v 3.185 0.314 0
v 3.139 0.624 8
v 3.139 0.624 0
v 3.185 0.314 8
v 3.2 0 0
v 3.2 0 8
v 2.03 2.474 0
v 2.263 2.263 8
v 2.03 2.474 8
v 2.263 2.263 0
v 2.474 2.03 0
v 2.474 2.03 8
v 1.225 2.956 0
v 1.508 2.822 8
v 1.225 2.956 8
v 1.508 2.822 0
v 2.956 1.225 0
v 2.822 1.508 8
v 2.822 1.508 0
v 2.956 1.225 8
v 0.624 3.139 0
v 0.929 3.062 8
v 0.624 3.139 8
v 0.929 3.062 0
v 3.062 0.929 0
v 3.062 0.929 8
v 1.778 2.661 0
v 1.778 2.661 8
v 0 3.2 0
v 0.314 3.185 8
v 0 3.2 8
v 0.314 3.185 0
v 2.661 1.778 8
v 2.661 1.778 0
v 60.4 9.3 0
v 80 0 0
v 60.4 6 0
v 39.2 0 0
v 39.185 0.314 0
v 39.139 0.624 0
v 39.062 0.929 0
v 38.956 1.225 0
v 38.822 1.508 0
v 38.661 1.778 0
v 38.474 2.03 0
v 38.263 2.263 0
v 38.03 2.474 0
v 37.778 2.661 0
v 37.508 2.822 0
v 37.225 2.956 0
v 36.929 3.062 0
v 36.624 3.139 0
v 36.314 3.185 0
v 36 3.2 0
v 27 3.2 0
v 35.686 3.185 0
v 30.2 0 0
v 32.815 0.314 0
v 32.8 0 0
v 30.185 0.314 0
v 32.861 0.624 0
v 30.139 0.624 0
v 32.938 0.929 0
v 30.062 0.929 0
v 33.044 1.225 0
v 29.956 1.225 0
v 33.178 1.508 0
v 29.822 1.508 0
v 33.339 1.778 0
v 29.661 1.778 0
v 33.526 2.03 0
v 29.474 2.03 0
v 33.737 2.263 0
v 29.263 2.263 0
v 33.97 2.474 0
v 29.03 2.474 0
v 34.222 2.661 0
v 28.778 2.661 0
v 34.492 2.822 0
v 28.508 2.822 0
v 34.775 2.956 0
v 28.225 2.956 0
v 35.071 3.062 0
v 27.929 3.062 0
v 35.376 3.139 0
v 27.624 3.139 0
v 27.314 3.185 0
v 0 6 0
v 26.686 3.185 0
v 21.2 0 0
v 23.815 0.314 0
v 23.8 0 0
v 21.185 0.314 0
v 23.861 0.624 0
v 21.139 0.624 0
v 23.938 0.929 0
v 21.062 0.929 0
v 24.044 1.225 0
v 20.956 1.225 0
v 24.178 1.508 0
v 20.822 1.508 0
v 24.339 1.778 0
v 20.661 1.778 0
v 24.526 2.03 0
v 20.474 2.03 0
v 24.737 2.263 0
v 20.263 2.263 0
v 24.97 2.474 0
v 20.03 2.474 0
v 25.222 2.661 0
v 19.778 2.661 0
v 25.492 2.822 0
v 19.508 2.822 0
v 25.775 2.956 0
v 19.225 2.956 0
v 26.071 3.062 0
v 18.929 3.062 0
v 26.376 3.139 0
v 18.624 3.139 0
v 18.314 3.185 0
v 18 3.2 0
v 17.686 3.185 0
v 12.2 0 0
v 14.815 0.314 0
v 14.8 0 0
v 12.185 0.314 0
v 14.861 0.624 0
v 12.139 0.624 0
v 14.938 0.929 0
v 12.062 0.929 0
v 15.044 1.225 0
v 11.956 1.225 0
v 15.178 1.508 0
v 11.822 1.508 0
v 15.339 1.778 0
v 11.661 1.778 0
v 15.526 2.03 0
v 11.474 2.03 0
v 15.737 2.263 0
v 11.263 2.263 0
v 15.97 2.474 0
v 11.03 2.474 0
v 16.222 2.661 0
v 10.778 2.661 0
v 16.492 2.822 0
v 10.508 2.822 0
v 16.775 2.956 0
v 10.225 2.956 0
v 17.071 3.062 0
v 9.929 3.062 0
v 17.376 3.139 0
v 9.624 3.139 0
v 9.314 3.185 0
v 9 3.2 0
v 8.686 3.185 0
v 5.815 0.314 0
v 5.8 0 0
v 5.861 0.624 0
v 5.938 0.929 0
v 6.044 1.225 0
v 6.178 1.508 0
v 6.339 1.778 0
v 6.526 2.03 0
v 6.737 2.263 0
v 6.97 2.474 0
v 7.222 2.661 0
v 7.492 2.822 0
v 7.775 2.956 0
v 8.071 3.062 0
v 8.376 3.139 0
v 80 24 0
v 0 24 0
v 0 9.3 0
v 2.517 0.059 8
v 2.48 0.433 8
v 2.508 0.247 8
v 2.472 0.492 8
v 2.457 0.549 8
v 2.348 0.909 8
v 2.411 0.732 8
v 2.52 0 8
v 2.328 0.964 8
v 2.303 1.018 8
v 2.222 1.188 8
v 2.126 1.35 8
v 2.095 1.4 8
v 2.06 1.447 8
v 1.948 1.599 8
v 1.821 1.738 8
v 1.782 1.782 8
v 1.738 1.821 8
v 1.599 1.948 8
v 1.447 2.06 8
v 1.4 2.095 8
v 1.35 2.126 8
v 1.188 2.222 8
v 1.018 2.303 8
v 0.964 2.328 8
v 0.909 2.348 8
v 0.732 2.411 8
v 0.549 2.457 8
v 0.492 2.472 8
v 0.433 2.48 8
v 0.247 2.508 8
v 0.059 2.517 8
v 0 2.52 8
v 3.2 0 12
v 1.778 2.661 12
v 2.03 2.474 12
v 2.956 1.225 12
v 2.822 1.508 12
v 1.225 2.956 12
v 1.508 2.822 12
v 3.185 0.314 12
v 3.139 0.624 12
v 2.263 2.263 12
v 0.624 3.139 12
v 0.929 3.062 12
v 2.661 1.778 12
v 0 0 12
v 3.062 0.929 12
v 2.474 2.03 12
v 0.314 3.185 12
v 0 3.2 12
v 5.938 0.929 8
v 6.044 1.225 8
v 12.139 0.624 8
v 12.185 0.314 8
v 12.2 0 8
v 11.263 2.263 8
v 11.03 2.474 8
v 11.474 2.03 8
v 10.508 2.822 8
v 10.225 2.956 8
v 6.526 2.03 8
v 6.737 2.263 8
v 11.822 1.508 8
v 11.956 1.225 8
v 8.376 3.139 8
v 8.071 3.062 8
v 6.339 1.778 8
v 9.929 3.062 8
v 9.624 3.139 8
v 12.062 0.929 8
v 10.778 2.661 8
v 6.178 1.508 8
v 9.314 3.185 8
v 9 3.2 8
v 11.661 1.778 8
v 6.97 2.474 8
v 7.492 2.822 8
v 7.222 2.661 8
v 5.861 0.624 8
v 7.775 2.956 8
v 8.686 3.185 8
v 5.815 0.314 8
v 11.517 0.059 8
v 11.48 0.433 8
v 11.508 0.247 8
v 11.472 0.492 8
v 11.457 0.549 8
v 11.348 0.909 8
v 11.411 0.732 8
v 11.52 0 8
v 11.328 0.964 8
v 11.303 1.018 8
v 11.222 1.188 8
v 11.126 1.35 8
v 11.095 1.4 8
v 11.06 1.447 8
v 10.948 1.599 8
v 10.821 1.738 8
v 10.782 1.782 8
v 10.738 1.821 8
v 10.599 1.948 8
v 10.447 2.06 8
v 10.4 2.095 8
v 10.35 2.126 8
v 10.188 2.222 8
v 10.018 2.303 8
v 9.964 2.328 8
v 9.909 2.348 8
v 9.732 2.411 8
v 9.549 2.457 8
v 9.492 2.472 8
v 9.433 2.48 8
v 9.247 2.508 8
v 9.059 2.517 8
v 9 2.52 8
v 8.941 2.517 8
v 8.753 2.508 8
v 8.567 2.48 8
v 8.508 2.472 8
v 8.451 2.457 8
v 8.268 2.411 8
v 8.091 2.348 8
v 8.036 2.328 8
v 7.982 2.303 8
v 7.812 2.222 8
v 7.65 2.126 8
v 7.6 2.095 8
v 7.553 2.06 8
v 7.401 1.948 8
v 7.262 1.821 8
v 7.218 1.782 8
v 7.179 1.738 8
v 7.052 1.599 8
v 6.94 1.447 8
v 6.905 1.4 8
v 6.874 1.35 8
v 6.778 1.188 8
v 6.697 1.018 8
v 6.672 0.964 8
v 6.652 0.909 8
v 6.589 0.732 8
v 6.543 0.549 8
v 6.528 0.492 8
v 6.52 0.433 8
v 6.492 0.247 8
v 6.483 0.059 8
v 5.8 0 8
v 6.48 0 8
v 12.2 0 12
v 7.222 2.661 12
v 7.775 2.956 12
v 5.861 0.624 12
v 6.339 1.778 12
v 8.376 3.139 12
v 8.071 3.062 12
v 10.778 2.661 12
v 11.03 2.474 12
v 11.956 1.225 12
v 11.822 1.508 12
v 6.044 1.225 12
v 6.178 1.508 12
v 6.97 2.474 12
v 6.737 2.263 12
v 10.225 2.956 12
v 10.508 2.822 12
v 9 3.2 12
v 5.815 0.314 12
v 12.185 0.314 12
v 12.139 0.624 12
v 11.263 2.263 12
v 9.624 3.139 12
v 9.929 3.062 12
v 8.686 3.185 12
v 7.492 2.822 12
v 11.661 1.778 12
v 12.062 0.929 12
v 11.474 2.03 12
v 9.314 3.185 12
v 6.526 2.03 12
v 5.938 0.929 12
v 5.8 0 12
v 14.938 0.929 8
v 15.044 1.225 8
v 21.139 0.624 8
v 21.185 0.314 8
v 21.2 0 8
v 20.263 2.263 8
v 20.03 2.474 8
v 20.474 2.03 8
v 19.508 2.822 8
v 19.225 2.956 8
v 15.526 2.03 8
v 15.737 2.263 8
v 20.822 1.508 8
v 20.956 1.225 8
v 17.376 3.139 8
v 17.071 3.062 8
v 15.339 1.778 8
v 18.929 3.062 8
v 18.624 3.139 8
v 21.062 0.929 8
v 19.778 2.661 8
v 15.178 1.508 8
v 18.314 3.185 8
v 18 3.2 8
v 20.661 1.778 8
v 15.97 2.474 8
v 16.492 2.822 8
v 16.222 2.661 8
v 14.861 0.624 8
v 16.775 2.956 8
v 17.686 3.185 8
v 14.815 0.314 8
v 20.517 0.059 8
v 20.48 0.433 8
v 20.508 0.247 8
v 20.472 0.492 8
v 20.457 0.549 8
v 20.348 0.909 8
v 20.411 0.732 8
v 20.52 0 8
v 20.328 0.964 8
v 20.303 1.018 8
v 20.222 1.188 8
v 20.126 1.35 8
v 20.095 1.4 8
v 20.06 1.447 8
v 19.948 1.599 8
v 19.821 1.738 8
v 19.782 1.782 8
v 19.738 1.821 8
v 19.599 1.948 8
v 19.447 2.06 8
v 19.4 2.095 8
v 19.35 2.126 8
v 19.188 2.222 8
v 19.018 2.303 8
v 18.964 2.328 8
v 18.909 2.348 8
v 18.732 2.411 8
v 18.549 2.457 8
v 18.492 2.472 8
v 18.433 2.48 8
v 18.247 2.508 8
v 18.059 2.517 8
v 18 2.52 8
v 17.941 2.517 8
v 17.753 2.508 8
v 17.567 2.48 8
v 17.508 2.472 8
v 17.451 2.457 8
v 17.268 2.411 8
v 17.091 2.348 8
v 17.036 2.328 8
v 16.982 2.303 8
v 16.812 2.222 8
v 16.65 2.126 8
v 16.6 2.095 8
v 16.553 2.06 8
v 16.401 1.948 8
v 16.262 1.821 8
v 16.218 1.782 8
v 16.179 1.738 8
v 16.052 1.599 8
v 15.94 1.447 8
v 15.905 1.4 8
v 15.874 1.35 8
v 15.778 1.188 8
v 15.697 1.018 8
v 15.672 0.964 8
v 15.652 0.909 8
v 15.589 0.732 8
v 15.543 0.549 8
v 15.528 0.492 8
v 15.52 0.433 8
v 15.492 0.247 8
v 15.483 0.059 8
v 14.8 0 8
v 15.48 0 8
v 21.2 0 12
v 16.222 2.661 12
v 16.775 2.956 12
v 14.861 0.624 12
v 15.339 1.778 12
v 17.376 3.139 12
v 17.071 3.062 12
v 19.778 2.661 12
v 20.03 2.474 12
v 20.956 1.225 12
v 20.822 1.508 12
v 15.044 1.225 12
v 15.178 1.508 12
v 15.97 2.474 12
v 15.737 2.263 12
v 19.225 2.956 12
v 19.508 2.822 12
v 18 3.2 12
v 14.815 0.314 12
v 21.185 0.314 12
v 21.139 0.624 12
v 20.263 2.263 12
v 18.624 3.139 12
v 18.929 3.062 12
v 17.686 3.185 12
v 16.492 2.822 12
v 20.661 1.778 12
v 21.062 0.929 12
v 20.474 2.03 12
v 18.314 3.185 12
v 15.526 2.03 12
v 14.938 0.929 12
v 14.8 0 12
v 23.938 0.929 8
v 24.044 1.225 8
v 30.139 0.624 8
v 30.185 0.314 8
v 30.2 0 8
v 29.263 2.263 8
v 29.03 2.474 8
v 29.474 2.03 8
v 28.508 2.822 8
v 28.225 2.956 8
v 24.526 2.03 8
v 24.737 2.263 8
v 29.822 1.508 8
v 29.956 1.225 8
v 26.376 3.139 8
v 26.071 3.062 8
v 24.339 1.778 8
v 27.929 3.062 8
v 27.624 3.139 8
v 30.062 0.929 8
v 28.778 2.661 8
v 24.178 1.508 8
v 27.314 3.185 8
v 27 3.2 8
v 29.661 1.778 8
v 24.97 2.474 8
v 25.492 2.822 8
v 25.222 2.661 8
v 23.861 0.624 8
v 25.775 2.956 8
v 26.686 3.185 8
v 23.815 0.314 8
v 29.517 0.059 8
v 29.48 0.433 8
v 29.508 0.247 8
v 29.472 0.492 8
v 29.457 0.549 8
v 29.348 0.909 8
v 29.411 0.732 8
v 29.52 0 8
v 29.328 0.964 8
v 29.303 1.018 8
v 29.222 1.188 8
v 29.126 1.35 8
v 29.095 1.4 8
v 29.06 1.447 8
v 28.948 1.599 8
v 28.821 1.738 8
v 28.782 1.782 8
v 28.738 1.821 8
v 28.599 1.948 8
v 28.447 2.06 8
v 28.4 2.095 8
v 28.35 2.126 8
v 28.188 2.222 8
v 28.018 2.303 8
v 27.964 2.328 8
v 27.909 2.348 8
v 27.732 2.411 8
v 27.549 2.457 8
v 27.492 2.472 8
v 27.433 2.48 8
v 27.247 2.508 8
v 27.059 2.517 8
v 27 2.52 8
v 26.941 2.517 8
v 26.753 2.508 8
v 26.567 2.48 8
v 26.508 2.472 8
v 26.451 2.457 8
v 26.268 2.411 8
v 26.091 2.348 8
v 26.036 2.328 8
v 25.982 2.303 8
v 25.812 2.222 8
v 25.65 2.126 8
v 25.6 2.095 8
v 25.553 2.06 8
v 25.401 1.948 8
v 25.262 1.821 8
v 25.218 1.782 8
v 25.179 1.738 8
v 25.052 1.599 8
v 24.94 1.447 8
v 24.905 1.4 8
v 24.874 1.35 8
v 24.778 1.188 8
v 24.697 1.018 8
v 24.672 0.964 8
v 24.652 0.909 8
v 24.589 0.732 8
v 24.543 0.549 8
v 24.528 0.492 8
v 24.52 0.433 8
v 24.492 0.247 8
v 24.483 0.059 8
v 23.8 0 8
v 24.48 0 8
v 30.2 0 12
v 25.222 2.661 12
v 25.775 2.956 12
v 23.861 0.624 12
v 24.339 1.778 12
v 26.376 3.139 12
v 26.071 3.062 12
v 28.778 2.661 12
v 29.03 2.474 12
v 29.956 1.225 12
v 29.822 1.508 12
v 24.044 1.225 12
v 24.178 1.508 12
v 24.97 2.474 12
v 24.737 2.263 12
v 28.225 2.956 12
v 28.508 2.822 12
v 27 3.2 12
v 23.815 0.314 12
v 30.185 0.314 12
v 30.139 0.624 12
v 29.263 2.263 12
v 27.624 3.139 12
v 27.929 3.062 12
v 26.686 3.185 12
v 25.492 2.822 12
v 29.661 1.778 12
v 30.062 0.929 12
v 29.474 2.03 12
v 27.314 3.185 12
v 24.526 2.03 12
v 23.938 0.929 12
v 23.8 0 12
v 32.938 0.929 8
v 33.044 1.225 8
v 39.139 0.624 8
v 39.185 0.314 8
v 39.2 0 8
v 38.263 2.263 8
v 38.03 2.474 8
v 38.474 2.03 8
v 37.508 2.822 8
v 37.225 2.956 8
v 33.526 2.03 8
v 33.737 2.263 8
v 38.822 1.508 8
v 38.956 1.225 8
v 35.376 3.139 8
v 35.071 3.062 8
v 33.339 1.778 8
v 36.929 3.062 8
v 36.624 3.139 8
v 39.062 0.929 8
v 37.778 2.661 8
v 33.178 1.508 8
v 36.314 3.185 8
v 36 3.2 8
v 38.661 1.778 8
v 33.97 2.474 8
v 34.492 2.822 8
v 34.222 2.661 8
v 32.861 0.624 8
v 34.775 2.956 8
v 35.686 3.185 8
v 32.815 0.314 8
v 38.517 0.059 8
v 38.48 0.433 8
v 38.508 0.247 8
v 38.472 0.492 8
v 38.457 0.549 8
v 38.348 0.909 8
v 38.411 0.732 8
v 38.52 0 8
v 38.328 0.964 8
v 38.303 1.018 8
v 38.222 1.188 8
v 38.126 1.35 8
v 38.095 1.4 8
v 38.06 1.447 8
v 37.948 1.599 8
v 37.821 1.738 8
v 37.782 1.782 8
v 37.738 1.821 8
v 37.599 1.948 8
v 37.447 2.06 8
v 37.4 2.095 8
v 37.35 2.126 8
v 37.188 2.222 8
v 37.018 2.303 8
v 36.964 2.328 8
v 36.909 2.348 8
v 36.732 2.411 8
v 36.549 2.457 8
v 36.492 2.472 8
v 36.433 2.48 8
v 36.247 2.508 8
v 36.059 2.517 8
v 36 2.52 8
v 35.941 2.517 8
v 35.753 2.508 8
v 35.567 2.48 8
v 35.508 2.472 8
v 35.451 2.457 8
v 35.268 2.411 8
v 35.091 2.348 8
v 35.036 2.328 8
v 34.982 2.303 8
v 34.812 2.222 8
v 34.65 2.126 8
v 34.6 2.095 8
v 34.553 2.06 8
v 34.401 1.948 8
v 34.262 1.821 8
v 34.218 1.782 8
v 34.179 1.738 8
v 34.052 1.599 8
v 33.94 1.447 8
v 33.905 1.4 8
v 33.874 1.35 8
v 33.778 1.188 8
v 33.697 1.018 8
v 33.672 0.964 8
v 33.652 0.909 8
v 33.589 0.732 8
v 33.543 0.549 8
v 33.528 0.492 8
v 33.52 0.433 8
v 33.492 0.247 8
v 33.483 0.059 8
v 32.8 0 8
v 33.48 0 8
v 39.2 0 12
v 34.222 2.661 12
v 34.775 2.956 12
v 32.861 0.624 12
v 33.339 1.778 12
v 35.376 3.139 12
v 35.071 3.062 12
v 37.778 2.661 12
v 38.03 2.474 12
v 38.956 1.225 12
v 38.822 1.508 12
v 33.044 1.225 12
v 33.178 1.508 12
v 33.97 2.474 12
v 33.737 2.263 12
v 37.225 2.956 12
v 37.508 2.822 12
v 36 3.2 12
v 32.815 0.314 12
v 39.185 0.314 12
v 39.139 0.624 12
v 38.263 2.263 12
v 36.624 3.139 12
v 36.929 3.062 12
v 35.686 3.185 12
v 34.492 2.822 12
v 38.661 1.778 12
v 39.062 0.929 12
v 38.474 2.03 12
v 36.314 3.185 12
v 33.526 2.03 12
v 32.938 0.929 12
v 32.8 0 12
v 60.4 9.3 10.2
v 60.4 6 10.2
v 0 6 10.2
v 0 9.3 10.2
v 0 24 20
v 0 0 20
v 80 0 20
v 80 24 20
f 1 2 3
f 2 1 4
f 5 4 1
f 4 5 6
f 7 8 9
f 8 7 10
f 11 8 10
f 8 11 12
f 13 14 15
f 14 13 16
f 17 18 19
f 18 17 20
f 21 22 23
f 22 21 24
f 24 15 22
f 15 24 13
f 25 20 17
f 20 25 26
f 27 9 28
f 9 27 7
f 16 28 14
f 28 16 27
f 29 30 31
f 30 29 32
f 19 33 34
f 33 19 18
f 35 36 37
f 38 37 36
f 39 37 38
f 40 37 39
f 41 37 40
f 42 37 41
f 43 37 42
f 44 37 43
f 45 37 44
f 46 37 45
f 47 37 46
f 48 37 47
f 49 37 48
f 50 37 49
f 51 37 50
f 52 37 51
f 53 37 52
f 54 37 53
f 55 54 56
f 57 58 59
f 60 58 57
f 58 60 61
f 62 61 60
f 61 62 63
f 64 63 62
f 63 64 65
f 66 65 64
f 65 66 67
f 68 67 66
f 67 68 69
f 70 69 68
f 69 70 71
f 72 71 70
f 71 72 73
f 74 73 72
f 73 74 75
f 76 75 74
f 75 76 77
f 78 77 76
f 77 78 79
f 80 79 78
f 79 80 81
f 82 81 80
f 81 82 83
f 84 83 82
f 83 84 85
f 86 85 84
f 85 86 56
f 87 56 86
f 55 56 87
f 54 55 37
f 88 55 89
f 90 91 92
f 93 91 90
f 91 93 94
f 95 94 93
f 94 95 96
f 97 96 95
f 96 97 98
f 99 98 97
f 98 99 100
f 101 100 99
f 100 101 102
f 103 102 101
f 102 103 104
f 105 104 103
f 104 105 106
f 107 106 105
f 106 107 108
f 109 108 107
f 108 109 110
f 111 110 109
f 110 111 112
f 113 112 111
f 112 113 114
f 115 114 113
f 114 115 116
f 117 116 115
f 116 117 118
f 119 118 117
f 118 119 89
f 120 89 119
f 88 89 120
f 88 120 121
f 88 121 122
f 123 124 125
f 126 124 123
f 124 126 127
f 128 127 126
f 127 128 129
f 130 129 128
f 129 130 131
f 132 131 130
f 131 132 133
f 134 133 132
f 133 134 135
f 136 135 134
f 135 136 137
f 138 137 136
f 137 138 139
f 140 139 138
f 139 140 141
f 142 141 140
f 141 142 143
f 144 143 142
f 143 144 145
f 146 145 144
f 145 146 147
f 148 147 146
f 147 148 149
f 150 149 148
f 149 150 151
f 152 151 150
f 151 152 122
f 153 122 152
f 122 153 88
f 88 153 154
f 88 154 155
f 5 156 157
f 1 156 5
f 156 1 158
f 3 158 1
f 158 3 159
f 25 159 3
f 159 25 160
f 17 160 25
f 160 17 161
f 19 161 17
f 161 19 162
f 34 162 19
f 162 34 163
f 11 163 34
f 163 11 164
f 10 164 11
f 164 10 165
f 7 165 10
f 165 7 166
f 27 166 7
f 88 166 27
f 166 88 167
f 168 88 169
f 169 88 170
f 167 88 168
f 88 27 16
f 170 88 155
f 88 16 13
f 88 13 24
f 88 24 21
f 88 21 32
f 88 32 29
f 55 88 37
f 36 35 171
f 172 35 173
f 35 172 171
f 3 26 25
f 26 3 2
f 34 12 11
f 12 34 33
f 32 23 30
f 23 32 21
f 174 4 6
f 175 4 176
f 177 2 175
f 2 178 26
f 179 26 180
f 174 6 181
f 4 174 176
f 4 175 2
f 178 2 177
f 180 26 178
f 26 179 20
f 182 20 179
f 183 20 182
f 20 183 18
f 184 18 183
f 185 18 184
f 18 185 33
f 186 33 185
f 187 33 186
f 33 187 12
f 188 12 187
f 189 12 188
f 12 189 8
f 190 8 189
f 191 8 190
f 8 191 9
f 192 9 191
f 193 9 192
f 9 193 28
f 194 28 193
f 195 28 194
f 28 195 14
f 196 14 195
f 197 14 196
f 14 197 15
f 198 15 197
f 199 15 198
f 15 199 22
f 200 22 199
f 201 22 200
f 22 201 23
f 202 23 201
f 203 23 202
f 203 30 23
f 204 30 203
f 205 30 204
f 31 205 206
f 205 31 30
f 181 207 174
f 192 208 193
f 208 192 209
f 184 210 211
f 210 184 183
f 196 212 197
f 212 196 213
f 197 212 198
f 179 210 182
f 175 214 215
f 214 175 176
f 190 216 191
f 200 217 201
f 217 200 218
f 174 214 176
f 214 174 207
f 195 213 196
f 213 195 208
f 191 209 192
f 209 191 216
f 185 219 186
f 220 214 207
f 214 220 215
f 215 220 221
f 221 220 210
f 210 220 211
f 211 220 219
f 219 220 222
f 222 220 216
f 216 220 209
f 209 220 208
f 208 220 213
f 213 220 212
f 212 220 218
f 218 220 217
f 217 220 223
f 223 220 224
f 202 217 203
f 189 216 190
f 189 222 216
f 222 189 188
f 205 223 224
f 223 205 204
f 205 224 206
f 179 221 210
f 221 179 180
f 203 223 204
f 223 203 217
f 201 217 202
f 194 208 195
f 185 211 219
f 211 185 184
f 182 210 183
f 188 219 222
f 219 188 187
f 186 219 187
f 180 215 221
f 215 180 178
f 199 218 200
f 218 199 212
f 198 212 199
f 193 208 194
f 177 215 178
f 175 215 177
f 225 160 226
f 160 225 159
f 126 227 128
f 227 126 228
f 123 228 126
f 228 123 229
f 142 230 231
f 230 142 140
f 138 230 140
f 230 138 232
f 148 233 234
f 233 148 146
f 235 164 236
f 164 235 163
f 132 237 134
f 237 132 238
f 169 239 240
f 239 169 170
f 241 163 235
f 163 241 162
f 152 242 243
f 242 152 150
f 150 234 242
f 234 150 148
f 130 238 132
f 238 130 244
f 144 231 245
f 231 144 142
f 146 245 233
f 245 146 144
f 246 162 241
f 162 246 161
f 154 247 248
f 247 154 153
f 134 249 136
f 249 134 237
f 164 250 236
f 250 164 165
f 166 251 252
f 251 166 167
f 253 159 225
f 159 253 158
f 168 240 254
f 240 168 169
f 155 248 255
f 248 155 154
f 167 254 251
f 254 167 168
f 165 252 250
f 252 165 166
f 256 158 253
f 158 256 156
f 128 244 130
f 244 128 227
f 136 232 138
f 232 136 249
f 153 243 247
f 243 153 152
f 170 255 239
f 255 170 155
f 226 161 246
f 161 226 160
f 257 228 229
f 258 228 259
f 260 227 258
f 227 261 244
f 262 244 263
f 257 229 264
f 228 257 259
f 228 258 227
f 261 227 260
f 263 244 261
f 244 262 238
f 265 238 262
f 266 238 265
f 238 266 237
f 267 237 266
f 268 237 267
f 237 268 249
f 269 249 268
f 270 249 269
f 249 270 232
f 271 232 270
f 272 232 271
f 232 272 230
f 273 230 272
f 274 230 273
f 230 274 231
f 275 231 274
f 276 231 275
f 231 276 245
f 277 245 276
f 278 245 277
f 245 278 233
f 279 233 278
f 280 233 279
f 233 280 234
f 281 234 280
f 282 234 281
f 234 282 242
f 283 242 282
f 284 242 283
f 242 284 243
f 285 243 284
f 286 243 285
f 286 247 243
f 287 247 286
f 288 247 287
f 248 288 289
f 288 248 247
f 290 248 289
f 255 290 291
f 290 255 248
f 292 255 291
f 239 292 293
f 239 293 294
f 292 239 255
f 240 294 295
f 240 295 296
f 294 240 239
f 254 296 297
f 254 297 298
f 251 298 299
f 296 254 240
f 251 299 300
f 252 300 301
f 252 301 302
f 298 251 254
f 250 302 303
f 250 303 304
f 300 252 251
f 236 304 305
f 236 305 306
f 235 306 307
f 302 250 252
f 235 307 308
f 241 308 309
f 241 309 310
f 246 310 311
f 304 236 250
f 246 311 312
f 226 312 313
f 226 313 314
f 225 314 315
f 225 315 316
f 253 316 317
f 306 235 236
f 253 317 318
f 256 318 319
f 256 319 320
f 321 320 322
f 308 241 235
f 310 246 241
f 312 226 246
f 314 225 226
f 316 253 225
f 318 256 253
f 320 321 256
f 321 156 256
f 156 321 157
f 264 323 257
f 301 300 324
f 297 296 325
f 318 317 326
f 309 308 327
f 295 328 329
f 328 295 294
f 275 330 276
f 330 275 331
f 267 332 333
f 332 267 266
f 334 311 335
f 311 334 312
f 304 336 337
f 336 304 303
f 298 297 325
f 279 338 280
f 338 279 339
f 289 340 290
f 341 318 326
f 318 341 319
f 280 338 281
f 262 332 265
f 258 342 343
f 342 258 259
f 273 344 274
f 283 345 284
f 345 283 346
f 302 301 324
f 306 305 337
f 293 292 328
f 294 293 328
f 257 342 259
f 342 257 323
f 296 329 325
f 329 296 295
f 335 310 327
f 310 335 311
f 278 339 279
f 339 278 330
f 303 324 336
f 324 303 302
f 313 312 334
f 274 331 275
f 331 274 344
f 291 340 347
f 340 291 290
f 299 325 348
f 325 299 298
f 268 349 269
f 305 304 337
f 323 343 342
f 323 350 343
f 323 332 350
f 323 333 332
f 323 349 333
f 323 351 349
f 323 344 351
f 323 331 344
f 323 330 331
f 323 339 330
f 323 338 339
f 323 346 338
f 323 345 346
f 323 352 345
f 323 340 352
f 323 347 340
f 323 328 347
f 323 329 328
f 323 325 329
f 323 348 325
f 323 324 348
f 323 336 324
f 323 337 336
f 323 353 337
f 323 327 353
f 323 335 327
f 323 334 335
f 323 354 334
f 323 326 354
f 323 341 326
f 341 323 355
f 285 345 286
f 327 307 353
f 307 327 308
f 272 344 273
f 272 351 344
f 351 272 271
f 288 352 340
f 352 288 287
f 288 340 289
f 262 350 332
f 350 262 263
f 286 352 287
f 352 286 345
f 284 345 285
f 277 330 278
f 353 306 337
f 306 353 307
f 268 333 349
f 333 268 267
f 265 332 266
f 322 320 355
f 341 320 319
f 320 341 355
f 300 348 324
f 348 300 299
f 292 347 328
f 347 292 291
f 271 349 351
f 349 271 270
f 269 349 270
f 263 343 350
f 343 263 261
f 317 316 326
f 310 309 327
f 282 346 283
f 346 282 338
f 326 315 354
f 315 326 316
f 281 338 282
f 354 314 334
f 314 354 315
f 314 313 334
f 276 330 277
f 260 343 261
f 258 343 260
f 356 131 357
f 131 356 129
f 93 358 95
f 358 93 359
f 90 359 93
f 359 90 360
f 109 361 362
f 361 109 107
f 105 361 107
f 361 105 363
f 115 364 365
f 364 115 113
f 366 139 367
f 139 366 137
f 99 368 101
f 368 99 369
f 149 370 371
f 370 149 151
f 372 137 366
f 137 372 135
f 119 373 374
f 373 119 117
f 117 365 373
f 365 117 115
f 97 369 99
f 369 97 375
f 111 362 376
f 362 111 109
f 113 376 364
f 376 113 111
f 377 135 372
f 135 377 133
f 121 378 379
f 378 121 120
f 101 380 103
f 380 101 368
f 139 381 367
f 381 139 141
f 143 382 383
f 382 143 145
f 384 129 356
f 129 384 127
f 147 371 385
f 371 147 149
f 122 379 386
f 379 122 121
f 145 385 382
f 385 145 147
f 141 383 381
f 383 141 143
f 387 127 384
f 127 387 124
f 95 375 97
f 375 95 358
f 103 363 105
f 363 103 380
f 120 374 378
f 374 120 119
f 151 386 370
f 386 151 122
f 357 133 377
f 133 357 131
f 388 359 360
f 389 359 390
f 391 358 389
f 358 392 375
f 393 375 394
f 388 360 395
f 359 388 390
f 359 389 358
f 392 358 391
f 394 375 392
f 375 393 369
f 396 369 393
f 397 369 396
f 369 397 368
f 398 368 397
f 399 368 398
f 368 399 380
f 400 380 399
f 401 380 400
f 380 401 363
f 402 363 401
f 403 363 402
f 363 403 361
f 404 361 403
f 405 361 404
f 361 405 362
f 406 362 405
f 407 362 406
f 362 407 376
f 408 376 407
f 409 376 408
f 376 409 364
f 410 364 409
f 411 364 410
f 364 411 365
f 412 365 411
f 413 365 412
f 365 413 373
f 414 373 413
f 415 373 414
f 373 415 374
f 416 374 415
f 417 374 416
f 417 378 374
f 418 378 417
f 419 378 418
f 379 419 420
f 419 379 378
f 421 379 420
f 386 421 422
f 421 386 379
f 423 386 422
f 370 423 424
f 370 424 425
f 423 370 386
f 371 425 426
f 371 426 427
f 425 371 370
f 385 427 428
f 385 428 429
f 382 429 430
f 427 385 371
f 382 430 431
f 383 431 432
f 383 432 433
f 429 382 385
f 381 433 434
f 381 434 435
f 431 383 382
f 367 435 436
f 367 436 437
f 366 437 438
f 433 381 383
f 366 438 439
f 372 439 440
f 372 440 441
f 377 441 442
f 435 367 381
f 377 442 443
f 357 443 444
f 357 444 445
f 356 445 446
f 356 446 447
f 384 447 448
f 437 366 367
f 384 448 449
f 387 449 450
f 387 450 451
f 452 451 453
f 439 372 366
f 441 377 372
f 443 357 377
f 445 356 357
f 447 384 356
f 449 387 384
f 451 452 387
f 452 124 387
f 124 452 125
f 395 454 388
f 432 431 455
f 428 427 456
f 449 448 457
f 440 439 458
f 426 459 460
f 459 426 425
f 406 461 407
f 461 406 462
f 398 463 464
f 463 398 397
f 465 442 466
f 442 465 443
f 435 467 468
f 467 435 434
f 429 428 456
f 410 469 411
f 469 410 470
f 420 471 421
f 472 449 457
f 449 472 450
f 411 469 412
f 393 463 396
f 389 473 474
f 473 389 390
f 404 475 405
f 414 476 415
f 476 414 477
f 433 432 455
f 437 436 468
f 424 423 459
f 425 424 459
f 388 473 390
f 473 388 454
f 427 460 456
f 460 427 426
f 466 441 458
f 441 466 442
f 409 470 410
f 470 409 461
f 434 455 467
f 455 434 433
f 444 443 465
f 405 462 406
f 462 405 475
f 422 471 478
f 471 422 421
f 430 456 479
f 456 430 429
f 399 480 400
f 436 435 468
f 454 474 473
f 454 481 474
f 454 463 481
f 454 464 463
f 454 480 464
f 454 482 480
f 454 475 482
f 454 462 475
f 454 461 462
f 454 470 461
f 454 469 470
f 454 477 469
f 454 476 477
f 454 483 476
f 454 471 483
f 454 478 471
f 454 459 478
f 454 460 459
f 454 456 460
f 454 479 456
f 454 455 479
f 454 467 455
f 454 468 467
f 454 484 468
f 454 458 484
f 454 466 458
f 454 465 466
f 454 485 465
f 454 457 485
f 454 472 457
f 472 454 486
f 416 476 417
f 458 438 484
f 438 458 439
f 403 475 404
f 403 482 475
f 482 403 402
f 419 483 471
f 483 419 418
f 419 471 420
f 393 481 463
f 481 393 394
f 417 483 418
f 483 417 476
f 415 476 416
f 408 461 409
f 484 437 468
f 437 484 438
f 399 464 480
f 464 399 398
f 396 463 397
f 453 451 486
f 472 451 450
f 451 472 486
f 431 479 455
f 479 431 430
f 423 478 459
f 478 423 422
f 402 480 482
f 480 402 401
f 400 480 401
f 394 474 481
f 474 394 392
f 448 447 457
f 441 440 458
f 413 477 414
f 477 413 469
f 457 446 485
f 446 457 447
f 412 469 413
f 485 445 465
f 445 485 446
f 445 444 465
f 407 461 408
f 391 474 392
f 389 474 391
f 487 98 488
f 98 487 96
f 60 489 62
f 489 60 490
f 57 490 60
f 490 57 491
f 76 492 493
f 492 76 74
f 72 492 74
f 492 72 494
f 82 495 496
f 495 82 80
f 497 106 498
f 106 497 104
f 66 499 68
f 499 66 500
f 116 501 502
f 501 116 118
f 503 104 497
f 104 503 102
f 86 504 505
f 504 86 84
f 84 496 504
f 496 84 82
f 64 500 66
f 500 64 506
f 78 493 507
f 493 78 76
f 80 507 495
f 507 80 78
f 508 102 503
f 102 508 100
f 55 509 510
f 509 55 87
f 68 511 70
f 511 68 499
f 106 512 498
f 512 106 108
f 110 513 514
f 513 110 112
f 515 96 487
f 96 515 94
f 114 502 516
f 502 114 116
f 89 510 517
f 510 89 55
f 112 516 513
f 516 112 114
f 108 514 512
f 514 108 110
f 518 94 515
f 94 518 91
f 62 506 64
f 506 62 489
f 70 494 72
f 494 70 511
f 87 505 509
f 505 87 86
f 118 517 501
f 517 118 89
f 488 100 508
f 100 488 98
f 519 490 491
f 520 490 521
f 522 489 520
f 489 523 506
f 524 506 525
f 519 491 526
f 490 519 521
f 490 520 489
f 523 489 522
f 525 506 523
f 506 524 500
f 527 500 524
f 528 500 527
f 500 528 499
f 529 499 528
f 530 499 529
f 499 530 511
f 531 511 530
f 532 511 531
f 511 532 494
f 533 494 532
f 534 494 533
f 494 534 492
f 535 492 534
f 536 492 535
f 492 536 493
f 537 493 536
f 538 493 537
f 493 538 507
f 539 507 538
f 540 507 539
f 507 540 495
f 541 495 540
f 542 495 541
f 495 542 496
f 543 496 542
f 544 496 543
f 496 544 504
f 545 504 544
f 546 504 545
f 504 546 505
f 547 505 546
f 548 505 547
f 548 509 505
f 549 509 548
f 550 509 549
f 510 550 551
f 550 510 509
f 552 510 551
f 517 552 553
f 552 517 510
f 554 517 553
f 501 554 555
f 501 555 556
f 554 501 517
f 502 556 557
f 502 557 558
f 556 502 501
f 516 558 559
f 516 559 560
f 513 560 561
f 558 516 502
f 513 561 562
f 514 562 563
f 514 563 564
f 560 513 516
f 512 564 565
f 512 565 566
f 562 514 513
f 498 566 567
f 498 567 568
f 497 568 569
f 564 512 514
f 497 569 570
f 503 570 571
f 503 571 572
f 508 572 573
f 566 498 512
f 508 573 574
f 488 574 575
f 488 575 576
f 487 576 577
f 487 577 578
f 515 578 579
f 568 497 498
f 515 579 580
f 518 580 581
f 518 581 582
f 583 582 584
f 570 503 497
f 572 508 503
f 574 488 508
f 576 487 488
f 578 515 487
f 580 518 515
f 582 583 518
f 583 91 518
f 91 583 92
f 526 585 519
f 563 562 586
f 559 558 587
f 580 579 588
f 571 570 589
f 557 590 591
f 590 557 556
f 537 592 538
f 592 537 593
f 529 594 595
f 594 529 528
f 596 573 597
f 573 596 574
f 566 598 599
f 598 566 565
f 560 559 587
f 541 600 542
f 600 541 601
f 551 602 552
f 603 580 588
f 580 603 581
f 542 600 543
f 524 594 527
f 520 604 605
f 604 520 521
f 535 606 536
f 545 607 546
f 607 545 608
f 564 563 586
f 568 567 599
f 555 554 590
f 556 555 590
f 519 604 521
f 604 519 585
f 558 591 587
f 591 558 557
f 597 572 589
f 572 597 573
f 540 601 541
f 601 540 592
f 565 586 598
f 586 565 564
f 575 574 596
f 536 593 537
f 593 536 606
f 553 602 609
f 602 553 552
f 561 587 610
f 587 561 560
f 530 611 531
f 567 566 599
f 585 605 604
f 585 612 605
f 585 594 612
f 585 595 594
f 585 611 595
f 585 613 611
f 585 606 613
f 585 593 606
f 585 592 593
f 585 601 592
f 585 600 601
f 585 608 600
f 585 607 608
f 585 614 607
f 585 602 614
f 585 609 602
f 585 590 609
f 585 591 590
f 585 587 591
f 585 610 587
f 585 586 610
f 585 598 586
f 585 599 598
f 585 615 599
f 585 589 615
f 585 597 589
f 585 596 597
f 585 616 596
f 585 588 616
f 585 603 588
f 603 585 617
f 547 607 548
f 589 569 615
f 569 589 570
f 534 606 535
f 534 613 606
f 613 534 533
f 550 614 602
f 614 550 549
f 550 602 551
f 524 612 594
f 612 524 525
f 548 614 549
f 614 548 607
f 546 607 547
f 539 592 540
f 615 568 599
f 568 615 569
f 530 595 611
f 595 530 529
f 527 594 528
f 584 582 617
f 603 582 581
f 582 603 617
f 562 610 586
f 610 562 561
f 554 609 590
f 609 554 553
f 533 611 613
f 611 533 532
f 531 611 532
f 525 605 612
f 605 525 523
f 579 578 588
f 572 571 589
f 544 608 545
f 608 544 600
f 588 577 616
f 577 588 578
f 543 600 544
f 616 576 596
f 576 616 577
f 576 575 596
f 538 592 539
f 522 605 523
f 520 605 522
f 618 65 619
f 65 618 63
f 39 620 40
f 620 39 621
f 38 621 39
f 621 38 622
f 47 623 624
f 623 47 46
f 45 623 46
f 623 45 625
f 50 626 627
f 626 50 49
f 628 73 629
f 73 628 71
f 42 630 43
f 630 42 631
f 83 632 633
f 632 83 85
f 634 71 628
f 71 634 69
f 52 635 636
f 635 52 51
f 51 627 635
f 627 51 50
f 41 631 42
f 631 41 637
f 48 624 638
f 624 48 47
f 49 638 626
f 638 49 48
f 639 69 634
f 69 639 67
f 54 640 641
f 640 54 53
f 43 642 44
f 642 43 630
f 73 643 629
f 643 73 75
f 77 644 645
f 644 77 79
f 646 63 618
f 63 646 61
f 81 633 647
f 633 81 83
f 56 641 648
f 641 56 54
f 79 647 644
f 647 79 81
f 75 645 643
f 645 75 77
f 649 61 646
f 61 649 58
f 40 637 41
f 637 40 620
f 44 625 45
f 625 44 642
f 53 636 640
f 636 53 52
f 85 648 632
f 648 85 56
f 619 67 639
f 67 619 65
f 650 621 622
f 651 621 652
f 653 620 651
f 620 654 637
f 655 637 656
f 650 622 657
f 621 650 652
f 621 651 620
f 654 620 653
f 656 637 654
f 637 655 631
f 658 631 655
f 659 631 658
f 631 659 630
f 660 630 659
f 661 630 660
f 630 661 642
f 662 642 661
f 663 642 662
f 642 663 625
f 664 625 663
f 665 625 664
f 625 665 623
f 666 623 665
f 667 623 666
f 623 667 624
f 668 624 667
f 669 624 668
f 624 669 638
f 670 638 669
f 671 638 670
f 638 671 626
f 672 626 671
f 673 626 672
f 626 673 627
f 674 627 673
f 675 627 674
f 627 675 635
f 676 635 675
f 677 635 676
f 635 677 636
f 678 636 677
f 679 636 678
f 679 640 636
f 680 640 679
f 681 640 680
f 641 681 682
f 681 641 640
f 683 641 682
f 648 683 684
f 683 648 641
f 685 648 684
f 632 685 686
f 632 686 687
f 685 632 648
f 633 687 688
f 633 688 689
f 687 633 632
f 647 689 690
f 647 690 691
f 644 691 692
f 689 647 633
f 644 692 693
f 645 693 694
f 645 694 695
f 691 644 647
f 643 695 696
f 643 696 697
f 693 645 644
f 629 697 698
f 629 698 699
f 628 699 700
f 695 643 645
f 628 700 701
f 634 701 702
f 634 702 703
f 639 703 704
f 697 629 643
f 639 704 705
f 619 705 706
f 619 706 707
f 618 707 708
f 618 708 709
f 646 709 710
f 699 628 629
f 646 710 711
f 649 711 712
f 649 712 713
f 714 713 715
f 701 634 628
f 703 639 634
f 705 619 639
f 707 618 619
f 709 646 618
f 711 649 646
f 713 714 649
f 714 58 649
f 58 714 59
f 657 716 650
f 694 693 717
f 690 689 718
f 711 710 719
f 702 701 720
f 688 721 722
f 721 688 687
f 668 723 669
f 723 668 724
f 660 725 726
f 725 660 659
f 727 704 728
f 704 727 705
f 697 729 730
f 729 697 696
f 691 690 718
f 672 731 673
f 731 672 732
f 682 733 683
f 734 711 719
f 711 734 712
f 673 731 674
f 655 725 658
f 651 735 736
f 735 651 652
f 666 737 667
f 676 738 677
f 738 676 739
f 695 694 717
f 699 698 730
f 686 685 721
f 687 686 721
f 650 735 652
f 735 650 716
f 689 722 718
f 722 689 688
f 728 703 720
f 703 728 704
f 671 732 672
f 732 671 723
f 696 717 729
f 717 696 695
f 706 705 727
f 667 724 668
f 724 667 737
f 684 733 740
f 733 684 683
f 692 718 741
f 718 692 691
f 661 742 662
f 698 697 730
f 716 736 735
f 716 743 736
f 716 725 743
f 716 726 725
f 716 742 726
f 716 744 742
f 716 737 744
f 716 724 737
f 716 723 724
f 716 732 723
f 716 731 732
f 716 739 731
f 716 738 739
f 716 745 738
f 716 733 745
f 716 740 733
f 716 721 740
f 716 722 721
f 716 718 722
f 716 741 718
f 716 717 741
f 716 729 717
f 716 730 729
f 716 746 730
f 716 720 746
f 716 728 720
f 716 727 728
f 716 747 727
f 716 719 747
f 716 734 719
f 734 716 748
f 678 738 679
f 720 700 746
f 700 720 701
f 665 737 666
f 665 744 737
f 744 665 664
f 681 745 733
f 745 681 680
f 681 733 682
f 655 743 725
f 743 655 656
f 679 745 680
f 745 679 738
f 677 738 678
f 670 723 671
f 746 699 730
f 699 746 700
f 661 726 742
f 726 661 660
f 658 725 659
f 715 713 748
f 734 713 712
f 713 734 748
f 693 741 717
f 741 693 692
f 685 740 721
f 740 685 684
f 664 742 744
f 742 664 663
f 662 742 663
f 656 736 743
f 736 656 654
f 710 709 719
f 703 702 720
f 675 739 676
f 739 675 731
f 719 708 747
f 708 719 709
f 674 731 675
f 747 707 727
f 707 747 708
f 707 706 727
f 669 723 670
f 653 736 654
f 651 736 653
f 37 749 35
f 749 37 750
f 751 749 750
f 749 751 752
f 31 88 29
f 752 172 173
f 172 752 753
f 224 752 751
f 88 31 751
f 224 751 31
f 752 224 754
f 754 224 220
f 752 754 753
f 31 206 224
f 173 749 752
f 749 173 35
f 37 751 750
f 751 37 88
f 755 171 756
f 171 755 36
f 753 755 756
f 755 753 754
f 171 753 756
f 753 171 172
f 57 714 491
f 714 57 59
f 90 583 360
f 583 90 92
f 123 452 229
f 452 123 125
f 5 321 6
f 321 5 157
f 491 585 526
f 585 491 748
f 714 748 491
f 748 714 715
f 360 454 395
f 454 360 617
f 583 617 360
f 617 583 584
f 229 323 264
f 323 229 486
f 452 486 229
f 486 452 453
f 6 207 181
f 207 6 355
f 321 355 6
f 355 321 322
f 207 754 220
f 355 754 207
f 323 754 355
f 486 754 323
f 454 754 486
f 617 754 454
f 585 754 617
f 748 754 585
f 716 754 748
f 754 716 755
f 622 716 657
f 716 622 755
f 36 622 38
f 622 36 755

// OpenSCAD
// Magnetic bead rack for one 8-tube strip of 0.2 mL PCR tubes
// Print orientation: rests on XY plane (z = 0), builds upward (+Z), centred on origin in X and Y.

// ---- Block dimensions (measured with calipers) ----
block_L = 80;   // length along X
block_W = 24;   // width  along Y
block_H = 20;   // height along Z

// ---- Tube seats ----
seat_pitch   = 9;    // centre-to-centre spacing along X
seat_top_d   = 6.4;  // hole diameter at top face (z = 20)
seat_top_z   = 20;   // top of the straight bore (block top face)
seat_cyl_bot = 12;   // z where the straight bore ends and the cone begins
seat_cone_d  = 3;    // cone exit diameter at z = 2
seat_cone_z  = 2;    // z where the cone ends (2 mm floor below)

// ---- Bar-magnet pockets (60 x 10 x 3 mm magnets, 0.2 mm clearance) ----
pocket_L = 60.4;    // length along X
pocket_W = 3.3;     // width  along Y
pocket_H = 10.2;    // height along Z (open at bottom, z = 0 to 10.2)
pocket_y = 6;       // centred at y = -6 and y = +6

// ---- Global ----
$fn = 64;           // round holes / cones

// ---- Build ----
module rack() {
    // Solid block, centred on origin in X and Y, sitting on z = 0
    difference() {
        cube([block_L, block_W, block_H], center = [true, true, false]);

        // 8 tube seats, 9 mm apart, centred on the block (y = 0)
        for (i = [-3, -2, -1, 0, 1, 2, 3, 4]) {
            translate([i * seat_pitch, 0, 0]) {
                // straight cylindrical bore from top face down to z = 12
                cylinder(h = seat_top_z - seat_cyl_bot,
                         d1 = seat_top_d, d2 = seat_top_d,
                         center = false);
                // conical taper from 6.4 mm at z = 12 down to 3 mm at z = 2
                translate([0, 0, seat_cone_z])
                    cylinder(h = seat_cyl_bot - seat_cone_z,
                             d1 = seat_cone_d, d2 = seat_top_d,
                             center = false);
            }
        }

        // two bar-magnet pockets, centred at y = -6 and y = +6, open at bottom
        for (py = [-pocket_y, pocket_y]) {
            translate([0, py, 0])
                cube([pocket_L, pocket_W, pocket_H], center = [true, true, false]);
        }
    }
}

rack();
